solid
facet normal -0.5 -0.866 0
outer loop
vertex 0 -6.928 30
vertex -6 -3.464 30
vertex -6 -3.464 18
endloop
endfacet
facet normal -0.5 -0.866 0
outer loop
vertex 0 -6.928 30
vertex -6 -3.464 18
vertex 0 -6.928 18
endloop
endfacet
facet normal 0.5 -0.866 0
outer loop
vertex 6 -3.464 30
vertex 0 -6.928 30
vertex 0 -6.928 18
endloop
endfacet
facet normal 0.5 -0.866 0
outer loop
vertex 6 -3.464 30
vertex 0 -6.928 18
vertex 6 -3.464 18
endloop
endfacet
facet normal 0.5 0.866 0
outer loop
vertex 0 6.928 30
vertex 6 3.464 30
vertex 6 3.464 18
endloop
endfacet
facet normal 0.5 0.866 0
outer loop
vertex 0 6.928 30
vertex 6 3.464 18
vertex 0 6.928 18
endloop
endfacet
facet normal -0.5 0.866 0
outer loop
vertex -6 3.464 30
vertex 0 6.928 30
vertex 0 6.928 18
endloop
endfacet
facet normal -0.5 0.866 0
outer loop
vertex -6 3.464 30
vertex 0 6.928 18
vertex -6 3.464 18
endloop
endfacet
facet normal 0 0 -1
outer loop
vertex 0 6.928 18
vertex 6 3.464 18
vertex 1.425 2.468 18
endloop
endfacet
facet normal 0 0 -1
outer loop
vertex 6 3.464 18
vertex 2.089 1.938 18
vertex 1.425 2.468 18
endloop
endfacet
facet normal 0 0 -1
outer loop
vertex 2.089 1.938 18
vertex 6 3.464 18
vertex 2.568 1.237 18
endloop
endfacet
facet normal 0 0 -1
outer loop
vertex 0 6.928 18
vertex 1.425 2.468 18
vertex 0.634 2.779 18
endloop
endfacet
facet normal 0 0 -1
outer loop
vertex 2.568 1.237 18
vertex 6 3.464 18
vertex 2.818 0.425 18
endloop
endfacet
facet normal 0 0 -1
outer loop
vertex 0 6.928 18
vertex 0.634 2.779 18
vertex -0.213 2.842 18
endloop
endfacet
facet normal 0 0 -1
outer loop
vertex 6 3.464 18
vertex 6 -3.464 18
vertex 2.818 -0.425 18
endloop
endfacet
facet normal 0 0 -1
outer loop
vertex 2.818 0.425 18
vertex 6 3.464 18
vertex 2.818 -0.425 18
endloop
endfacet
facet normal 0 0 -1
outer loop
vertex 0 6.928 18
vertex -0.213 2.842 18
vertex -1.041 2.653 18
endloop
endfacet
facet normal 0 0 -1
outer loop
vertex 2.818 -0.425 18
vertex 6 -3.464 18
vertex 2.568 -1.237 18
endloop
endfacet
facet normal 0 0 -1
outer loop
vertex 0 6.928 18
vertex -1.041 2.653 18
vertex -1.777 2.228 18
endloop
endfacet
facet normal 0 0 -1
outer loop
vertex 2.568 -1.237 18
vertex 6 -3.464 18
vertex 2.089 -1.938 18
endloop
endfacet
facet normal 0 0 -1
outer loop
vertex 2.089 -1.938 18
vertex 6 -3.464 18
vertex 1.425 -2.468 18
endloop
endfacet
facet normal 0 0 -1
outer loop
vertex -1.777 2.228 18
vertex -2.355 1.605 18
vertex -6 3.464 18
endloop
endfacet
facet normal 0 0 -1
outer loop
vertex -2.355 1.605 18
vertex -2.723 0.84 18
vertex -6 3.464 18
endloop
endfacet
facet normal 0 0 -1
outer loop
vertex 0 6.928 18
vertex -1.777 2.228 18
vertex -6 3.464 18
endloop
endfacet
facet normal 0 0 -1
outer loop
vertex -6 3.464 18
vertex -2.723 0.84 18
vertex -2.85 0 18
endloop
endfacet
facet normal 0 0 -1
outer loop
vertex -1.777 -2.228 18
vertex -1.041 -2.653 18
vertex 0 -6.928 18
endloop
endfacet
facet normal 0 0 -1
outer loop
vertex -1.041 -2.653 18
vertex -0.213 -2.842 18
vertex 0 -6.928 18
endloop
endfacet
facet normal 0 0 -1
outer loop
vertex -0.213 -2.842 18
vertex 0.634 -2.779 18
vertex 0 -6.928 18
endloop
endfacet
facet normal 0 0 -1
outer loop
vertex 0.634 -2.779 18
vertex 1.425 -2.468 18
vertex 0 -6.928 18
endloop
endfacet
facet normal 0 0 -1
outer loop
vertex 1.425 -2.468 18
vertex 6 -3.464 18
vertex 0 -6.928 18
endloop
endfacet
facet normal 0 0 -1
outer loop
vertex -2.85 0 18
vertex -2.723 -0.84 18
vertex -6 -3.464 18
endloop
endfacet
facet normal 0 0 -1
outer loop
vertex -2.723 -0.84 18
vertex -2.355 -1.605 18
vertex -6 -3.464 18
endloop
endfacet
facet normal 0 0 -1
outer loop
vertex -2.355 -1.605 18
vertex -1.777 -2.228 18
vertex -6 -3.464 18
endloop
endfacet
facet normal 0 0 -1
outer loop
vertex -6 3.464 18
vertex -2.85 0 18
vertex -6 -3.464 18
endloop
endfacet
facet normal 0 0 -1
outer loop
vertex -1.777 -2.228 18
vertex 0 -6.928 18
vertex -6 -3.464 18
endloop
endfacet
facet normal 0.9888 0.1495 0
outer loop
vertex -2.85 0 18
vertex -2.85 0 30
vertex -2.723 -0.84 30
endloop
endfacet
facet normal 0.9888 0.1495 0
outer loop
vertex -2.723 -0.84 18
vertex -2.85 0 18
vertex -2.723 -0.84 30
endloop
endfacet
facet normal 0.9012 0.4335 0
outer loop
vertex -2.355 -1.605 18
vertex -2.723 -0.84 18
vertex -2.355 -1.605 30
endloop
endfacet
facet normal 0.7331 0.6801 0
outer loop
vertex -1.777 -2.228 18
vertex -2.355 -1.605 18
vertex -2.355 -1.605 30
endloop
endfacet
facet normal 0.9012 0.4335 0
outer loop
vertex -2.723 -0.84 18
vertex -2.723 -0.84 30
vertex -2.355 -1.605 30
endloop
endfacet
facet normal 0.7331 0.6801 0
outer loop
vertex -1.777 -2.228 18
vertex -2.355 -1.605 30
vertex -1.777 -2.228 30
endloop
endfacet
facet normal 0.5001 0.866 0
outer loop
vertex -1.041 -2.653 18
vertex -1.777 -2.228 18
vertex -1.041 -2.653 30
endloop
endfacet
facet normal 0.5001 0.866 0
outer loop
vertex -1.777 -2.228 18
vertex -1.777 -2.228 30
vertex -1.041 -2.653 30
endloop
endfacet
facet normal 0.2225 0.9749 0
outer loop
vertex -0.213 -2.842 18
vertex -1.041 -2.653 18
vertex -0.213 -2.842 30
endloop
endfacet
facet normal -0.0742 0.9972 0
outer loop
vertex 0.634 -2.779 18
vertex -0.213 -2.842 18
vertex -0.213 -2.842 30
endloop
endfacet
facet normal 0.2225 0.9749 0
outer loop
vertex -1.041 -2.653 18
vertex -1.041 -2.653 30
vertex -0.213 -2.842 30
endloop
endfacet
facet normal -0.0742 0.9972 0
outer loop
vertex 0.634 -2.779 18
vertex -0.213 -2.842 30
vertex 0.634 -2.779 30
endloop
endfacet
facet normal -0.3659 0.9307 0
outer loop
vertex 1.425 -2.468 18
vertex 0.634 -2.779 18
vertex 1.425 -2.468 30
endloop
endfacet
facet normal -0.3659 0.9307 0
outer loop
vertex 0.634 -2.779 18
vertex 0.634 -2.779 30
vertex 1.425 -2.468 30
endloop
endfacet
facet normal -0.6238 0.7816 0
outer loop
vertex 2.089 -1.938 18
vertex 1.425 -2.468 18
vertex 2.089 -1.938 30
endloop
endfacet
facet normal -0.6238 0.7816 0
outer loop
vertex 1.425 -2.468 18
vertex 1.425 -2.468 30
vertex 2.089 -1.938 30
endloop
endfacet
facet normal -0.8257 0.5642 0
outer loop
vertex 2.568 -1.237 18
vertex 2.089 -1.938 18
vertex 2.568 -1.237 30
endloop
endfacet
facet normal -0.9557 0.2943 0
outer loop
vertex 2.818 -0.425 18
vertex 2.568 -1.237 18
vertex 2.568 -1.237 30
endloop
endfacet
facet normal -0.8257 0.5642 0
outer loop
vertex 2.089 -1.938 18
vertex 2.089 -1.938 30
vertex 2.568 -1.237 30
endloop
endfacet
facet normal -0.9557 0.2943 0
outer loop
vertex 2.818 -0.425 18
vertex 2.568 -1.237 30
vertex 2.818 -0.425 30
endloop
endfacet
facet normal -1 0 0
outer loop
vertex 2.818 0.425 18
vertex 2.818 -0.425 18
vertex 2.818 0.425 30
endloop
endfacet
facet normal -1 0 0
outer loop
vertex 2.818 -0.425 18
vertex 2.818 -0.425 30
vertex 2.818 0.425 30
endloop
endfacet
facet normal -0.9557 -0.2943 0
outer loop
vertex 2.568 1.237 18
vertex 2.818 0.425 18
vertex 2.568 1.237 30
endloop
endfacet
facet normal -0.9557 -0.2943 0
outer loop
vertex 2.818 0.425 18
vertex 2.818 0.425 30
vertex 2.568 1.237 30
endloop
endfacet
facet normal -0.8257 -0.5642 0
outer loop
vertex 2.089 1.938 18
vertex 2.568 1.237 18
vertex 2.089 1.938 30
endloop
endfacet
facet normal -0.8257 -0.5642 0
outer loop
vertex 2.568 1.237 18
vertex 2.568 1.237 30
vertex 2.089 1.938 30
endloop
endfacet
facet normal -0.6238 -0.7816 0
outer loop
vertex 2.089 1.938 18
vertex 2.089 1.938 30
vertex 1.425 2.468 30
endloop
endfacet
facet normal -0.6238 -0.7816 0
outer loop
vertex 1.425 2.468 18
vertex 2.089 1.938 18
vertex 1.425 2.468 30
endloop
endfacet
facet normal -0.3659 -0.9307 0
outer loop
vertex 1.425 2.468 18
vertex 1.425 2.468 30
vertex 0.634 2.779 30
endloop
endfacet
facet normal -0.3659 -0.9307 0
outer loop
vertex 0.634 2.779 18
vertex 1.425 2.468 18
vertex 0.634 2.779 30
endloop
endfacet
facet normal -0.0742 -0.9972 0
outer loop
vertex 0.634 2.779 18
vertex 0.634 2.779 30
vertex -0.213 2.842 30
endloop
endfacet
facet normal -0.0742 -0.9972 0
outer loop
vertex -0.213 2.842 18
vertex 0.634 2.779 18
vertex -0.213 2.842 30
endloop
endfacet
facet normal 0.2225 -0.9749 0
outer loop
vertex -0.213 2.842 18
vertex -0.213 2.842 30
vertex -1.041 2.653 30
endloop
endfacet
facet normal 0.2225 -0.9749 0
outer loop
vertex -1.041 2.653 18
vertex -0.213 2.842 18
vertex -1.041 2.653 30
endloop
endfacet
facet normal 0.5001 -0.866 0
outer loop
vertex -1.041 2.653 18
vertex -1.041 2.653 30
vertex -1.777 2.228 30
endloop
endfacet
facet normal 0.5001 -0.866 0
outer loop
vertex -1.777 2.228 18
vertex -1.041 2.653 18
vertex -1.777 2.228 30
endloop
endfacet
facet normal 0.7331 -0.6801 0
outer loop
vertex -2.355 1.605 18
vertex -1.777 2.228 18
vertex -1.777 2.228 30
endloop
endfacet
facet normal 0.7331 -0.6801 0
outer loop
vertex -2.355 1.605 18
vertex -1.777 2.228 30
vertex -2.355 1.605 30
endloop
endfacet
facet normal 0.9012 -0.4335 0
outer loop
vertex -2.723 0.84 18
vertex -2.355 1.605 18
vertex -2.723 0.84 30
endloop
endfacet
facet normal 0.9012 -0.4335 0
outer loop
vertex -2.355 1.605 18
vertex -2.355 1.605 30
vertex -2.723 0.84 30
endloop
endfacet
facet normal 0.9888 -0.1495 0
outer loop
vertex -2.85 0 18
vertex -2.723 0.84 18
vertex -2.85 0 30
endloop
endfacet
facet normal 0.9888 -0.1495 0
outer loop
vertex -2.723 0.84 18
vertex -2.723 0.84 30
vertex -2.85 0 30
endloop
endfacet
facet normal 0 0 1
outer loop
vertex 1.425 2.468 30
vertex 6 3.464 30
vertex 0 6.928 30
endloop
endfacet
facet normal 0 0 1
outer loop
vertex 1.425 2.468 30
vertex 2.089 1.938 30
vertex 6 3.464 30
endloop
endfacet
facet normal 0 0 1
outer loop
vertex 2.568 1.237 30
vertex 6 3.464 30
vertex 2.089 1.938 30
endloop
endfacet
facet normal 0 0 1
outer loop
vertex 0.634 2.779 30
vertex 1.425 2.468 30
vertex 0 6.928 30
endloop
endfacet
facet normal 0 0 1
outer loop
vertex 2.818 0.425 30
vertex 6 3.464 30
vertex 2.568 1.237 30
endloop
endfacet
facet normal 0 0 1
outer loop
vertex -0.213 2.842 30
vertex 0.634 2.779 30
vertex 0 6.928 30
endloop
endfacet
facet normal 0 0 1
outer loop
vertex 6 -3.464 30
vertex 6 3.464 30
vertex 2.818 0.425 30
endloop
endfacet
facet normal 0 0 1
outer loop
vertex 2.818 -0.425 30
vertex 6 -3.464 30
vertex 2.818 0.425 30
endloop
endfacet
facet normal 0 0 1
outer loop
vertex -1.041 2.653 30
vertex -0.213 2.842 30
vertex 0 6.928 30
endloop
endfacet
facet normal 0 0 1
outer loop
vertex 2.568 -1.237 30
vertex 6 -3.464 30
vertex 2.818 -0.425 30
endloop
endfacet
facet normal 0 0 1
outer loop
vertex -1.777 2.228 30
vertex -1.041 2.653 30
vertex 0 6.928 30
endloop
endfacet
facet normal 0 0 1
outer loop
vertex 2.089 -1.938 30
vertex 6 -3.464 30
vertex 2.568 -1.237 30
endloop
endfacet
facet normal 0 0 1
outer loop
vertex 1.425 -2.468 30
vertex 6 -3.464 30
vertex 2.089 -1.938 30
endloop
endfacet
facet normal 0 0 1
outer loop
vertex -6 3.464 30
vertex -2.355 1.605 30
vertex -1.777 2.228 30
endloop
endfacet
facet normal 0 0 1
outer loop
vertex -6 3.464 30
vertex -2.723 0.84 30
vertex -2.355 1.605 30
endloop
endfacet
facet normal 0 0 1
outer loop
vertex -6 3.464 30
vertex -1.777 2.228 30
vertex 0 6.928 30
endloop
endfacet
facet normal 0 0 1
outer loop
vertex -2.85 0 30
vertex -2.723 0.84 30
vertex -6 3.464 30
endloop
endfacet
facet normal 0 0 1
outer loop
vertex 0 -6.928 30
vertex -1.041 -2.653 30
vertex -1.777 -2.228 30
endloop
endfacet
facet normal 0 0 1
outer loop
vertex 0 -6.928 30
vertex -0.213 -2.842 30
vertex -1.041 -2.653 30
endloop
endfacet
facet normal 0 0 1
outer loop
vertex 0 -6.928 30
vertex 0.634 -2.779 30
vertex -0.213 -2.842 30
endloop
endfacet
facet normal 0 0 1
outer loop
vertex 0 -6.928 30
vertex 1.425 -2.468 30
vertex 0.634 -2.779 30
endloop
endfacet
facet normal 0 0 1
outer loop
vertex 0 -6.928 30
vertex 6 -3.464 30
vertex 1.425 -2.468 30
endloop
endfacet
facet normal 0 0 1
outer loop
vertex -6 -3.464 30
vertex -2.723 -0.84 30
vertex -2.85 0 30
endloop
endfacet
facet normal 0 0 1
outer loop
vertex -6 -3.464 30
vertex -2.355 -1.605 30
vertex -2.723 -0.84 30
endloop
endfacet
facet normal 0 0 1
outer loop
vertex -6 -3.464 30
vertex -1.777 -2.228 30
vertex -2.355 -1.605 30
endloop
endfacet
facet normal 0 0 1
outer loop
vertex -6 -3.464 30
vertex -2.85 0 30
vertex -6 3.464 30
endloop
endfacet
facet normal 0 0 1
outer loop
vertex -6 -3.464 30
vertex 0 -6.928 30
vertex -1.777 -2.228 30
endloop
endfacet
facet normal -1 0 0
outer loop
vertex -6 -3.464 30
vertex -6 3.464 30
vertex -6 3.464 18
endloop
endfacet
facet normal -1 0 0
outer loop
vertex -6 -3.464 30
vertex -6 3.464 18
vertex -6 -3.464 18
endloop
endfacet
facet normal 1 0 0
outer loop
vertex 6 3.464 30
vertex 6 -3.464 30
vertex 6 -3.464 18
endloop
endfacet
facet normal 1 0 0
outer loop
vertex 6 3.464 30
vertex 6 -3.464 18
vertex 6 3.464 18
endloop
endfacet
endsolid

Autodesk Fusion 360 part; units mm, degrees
sketch "Sketch1" plane through (0, 0, 0) normal (0, 0, 1) x (1, 0, 0)
  line L0 (-5.5, -3.1754) -> (0, -6.3509)
  line L1 (0, -6.3509) -> (5.5, -3.1754)
  line L2 (5.5, -3.1754) -> (5.5, 3.1754)
  line L3 (5.5, 3.1754) -> (0, 6.3509)
  line L4 (0, 6.3509) -> (-5.5, 3.1754)
  line L5 (-5.5, 3.1754) -> (-5.5, -3.1754)
  dimension "d1" = 5.5
extrude "Extrude1" add sketch "Sketch1" along normal blind 5
sketch "Sketch2" plane through (0, 0, 5) normal (0, 0, 1) x (-1, 0, 0)
  line L0 (5.5, -3.1754) -> (5.5, 3.1754)
  line L1 (5.5, 3.1754) -> (0, 6.3509)
  line L2 (0, 6.3509) -> (-5.5, 3.1754)
  line L3 (-5.5, 3.1754) -> (-5.5, -3.1754)
  line L4 (-5.5, -3.1754) -> (0, -6.3509)
  line L5 (0, -6.3509) -> (5.5, -3.1754)
  circle A0 centre (0, 0) radius 2
  dimension "d4" = 4
extrude "Extrude2" cut sketch "Sketch2" against normal blind 12 contours A0
extrude "Extrude3" add 1 faces at (-4.3333, 0, 5) along direction (0, 0, 1) blind 25
sketch "Sketch3" plane through (0, 0, 30) normal (0, 0, 1) x (-1, 0, 0)
  circle A0 centre (0, 0) radius 2
  line L0 (5.5, -3.1754) -> (5.5, 3.1754)
  line L1 (5.5, 3.1754) -> (0, 6.3509)
  line L2 (0, 6.3509) -> (-5.5, 3.1754)
  line L3 (-5.5, 3.1754) -> (-5.5, -3.1754)
  line L4 (-5.5, -3.1754) -> (0, -6.3509)
  line L5 (0, -6.3509) -> (5.5, -3.1754)
  line L6 (-5.8, -3.3486) -> (0, -6.6973)
  line L7 (0, -6.6973) -> (5.8, -3.3486)
  line L8 (5.8, -3.3486) -> (5.8, 3.3486)
  line L9 (5.8, 3.3486) -> (0, 6.6973)
  line L10 (0, 6.6973) -> (-5.8, 3.3486)
  line L11 (-5.8, 3.3486) -> (-5.8, -3.3486)
  dimension "d9" = 5.8
extrude "Extrude4" add sketch "Sketch3" against normal blind 16 contours L6 L7 L8 L9 L10 L11
sketch "Sketch4" plane through (0, 0, 30) normal (0, 0, 1) x (-1, 0, 0)
  line L0 (-5.8, 3.3486) -> (-5.8, -3.3486)
  line L1 (-5.8, -3.3486) -> (0, -6.6973)
  line L2 (0, -6.6973) -> (5.8, -3.3486)
  line L3 (5.8, -3.3486) -> (5.8, 3.3486)
  line L4 (5.8, 3.3486) -> (0, 6.6973)
  line L5 (0, 6.6973) -> (-5.8, 3.3486)
  circle A0 centre (0, 0) radius 2
  circle A1 centre (0, 0) radius 2.65
  dimension "d12" = 5.3
extrude "Extrude5" cut sketch "Sketch4" against normal blind 35 contours A1
extrude "Extrude6" cut 1 faces at (-2.275, -3.9404, 0) along direction (0, 0, 1) blind 2
extrude "Extrude7" cut 1 faces at (2.375, -4.1136, 30) along direction (0, 0, -1) blind 33 from surface at 12
sketch "Sketch5" plane through (0, 0, 30) normal (0, 0, 1) x (-1, 0, 0)
  circle A0 centre (0, 0) radius 2.65
  line L0 (-5.8, 3.3486) -> (-5.8, -3.3486)
  line L1 (-5.8, -3.3486) -> (0, -6.6973)
  line L2 (0, -6.6973) -> (5.8, -3.3486)
  line L3 (5.8, -3.3486) -> (5.8, 3.3486)
  line L4 (5.8, 3.3486) -> (0, 6.6973)
  line L5 (0, 6.6973) -> (-5.8, 3.3486)
  line L6 (-6.1, -3.5218) -> (0, -7.0437)
  line L7 (0, -7.0437) -> (6.1, -3.5218)
  line L8 (6.1, -3.5218) -> (6.1, 3.5218)
  line L9 (6.1, 3.5218) -> (0, 7.0437)
  line L10 (0, 7.0437) -> (-6.1, 3.5218)
  line L11 (-6.1, 3.5218) -> (-6.1, -3.5218)
  dimension "d20" = 6.1
extrude "Extrude8" add sketch "Sketch5" against normal blind 12 contours L6 L7 L8 L9 L10 L11
sketch "Sketch6" plane through (0, 0, 30) normal (0, 0, 1) x (-1, 0, 0)
  line L0 (-6.1, 3.5218) -> (-6.1, -3.5218)
  line L1 (-6.1, -3.5218) -> (0, -7.0437)
  line L2 (0, -7.0437) -> (6.1, -3.5218)
  line L3 (6.1, -3.5218) -> (6.1, 3.5218)
  line L4 (6.1, 3.5218) -> (0, 7.0437)
  line L5 (0, 7.0437) -> (-6.1, 3.5218)
  circle A0 centre (0, 0) radius 2.65
  line L6 (-6, -3.4641) -> (0, -6.9282)
  line L7 (0, -6.9282) -> (6, -3.4641)
  line L8 (6, -3.4641) -> (6, 3.4641)
  line L9 (6, 3.4641) -> (0, 6.9282)
  line L10 (0, 6.9282) -> (-6, 3.4641)
  line L11 (-6, 3.4641) -> (-6, -3.4641)
  circle A1 centre (0, 0) radius 2.85
  dimension "d23" = 6
  dimension "d24" = 5.7
extrude "Extrude9" cut sketch "Sketch6" against normal blind 13
